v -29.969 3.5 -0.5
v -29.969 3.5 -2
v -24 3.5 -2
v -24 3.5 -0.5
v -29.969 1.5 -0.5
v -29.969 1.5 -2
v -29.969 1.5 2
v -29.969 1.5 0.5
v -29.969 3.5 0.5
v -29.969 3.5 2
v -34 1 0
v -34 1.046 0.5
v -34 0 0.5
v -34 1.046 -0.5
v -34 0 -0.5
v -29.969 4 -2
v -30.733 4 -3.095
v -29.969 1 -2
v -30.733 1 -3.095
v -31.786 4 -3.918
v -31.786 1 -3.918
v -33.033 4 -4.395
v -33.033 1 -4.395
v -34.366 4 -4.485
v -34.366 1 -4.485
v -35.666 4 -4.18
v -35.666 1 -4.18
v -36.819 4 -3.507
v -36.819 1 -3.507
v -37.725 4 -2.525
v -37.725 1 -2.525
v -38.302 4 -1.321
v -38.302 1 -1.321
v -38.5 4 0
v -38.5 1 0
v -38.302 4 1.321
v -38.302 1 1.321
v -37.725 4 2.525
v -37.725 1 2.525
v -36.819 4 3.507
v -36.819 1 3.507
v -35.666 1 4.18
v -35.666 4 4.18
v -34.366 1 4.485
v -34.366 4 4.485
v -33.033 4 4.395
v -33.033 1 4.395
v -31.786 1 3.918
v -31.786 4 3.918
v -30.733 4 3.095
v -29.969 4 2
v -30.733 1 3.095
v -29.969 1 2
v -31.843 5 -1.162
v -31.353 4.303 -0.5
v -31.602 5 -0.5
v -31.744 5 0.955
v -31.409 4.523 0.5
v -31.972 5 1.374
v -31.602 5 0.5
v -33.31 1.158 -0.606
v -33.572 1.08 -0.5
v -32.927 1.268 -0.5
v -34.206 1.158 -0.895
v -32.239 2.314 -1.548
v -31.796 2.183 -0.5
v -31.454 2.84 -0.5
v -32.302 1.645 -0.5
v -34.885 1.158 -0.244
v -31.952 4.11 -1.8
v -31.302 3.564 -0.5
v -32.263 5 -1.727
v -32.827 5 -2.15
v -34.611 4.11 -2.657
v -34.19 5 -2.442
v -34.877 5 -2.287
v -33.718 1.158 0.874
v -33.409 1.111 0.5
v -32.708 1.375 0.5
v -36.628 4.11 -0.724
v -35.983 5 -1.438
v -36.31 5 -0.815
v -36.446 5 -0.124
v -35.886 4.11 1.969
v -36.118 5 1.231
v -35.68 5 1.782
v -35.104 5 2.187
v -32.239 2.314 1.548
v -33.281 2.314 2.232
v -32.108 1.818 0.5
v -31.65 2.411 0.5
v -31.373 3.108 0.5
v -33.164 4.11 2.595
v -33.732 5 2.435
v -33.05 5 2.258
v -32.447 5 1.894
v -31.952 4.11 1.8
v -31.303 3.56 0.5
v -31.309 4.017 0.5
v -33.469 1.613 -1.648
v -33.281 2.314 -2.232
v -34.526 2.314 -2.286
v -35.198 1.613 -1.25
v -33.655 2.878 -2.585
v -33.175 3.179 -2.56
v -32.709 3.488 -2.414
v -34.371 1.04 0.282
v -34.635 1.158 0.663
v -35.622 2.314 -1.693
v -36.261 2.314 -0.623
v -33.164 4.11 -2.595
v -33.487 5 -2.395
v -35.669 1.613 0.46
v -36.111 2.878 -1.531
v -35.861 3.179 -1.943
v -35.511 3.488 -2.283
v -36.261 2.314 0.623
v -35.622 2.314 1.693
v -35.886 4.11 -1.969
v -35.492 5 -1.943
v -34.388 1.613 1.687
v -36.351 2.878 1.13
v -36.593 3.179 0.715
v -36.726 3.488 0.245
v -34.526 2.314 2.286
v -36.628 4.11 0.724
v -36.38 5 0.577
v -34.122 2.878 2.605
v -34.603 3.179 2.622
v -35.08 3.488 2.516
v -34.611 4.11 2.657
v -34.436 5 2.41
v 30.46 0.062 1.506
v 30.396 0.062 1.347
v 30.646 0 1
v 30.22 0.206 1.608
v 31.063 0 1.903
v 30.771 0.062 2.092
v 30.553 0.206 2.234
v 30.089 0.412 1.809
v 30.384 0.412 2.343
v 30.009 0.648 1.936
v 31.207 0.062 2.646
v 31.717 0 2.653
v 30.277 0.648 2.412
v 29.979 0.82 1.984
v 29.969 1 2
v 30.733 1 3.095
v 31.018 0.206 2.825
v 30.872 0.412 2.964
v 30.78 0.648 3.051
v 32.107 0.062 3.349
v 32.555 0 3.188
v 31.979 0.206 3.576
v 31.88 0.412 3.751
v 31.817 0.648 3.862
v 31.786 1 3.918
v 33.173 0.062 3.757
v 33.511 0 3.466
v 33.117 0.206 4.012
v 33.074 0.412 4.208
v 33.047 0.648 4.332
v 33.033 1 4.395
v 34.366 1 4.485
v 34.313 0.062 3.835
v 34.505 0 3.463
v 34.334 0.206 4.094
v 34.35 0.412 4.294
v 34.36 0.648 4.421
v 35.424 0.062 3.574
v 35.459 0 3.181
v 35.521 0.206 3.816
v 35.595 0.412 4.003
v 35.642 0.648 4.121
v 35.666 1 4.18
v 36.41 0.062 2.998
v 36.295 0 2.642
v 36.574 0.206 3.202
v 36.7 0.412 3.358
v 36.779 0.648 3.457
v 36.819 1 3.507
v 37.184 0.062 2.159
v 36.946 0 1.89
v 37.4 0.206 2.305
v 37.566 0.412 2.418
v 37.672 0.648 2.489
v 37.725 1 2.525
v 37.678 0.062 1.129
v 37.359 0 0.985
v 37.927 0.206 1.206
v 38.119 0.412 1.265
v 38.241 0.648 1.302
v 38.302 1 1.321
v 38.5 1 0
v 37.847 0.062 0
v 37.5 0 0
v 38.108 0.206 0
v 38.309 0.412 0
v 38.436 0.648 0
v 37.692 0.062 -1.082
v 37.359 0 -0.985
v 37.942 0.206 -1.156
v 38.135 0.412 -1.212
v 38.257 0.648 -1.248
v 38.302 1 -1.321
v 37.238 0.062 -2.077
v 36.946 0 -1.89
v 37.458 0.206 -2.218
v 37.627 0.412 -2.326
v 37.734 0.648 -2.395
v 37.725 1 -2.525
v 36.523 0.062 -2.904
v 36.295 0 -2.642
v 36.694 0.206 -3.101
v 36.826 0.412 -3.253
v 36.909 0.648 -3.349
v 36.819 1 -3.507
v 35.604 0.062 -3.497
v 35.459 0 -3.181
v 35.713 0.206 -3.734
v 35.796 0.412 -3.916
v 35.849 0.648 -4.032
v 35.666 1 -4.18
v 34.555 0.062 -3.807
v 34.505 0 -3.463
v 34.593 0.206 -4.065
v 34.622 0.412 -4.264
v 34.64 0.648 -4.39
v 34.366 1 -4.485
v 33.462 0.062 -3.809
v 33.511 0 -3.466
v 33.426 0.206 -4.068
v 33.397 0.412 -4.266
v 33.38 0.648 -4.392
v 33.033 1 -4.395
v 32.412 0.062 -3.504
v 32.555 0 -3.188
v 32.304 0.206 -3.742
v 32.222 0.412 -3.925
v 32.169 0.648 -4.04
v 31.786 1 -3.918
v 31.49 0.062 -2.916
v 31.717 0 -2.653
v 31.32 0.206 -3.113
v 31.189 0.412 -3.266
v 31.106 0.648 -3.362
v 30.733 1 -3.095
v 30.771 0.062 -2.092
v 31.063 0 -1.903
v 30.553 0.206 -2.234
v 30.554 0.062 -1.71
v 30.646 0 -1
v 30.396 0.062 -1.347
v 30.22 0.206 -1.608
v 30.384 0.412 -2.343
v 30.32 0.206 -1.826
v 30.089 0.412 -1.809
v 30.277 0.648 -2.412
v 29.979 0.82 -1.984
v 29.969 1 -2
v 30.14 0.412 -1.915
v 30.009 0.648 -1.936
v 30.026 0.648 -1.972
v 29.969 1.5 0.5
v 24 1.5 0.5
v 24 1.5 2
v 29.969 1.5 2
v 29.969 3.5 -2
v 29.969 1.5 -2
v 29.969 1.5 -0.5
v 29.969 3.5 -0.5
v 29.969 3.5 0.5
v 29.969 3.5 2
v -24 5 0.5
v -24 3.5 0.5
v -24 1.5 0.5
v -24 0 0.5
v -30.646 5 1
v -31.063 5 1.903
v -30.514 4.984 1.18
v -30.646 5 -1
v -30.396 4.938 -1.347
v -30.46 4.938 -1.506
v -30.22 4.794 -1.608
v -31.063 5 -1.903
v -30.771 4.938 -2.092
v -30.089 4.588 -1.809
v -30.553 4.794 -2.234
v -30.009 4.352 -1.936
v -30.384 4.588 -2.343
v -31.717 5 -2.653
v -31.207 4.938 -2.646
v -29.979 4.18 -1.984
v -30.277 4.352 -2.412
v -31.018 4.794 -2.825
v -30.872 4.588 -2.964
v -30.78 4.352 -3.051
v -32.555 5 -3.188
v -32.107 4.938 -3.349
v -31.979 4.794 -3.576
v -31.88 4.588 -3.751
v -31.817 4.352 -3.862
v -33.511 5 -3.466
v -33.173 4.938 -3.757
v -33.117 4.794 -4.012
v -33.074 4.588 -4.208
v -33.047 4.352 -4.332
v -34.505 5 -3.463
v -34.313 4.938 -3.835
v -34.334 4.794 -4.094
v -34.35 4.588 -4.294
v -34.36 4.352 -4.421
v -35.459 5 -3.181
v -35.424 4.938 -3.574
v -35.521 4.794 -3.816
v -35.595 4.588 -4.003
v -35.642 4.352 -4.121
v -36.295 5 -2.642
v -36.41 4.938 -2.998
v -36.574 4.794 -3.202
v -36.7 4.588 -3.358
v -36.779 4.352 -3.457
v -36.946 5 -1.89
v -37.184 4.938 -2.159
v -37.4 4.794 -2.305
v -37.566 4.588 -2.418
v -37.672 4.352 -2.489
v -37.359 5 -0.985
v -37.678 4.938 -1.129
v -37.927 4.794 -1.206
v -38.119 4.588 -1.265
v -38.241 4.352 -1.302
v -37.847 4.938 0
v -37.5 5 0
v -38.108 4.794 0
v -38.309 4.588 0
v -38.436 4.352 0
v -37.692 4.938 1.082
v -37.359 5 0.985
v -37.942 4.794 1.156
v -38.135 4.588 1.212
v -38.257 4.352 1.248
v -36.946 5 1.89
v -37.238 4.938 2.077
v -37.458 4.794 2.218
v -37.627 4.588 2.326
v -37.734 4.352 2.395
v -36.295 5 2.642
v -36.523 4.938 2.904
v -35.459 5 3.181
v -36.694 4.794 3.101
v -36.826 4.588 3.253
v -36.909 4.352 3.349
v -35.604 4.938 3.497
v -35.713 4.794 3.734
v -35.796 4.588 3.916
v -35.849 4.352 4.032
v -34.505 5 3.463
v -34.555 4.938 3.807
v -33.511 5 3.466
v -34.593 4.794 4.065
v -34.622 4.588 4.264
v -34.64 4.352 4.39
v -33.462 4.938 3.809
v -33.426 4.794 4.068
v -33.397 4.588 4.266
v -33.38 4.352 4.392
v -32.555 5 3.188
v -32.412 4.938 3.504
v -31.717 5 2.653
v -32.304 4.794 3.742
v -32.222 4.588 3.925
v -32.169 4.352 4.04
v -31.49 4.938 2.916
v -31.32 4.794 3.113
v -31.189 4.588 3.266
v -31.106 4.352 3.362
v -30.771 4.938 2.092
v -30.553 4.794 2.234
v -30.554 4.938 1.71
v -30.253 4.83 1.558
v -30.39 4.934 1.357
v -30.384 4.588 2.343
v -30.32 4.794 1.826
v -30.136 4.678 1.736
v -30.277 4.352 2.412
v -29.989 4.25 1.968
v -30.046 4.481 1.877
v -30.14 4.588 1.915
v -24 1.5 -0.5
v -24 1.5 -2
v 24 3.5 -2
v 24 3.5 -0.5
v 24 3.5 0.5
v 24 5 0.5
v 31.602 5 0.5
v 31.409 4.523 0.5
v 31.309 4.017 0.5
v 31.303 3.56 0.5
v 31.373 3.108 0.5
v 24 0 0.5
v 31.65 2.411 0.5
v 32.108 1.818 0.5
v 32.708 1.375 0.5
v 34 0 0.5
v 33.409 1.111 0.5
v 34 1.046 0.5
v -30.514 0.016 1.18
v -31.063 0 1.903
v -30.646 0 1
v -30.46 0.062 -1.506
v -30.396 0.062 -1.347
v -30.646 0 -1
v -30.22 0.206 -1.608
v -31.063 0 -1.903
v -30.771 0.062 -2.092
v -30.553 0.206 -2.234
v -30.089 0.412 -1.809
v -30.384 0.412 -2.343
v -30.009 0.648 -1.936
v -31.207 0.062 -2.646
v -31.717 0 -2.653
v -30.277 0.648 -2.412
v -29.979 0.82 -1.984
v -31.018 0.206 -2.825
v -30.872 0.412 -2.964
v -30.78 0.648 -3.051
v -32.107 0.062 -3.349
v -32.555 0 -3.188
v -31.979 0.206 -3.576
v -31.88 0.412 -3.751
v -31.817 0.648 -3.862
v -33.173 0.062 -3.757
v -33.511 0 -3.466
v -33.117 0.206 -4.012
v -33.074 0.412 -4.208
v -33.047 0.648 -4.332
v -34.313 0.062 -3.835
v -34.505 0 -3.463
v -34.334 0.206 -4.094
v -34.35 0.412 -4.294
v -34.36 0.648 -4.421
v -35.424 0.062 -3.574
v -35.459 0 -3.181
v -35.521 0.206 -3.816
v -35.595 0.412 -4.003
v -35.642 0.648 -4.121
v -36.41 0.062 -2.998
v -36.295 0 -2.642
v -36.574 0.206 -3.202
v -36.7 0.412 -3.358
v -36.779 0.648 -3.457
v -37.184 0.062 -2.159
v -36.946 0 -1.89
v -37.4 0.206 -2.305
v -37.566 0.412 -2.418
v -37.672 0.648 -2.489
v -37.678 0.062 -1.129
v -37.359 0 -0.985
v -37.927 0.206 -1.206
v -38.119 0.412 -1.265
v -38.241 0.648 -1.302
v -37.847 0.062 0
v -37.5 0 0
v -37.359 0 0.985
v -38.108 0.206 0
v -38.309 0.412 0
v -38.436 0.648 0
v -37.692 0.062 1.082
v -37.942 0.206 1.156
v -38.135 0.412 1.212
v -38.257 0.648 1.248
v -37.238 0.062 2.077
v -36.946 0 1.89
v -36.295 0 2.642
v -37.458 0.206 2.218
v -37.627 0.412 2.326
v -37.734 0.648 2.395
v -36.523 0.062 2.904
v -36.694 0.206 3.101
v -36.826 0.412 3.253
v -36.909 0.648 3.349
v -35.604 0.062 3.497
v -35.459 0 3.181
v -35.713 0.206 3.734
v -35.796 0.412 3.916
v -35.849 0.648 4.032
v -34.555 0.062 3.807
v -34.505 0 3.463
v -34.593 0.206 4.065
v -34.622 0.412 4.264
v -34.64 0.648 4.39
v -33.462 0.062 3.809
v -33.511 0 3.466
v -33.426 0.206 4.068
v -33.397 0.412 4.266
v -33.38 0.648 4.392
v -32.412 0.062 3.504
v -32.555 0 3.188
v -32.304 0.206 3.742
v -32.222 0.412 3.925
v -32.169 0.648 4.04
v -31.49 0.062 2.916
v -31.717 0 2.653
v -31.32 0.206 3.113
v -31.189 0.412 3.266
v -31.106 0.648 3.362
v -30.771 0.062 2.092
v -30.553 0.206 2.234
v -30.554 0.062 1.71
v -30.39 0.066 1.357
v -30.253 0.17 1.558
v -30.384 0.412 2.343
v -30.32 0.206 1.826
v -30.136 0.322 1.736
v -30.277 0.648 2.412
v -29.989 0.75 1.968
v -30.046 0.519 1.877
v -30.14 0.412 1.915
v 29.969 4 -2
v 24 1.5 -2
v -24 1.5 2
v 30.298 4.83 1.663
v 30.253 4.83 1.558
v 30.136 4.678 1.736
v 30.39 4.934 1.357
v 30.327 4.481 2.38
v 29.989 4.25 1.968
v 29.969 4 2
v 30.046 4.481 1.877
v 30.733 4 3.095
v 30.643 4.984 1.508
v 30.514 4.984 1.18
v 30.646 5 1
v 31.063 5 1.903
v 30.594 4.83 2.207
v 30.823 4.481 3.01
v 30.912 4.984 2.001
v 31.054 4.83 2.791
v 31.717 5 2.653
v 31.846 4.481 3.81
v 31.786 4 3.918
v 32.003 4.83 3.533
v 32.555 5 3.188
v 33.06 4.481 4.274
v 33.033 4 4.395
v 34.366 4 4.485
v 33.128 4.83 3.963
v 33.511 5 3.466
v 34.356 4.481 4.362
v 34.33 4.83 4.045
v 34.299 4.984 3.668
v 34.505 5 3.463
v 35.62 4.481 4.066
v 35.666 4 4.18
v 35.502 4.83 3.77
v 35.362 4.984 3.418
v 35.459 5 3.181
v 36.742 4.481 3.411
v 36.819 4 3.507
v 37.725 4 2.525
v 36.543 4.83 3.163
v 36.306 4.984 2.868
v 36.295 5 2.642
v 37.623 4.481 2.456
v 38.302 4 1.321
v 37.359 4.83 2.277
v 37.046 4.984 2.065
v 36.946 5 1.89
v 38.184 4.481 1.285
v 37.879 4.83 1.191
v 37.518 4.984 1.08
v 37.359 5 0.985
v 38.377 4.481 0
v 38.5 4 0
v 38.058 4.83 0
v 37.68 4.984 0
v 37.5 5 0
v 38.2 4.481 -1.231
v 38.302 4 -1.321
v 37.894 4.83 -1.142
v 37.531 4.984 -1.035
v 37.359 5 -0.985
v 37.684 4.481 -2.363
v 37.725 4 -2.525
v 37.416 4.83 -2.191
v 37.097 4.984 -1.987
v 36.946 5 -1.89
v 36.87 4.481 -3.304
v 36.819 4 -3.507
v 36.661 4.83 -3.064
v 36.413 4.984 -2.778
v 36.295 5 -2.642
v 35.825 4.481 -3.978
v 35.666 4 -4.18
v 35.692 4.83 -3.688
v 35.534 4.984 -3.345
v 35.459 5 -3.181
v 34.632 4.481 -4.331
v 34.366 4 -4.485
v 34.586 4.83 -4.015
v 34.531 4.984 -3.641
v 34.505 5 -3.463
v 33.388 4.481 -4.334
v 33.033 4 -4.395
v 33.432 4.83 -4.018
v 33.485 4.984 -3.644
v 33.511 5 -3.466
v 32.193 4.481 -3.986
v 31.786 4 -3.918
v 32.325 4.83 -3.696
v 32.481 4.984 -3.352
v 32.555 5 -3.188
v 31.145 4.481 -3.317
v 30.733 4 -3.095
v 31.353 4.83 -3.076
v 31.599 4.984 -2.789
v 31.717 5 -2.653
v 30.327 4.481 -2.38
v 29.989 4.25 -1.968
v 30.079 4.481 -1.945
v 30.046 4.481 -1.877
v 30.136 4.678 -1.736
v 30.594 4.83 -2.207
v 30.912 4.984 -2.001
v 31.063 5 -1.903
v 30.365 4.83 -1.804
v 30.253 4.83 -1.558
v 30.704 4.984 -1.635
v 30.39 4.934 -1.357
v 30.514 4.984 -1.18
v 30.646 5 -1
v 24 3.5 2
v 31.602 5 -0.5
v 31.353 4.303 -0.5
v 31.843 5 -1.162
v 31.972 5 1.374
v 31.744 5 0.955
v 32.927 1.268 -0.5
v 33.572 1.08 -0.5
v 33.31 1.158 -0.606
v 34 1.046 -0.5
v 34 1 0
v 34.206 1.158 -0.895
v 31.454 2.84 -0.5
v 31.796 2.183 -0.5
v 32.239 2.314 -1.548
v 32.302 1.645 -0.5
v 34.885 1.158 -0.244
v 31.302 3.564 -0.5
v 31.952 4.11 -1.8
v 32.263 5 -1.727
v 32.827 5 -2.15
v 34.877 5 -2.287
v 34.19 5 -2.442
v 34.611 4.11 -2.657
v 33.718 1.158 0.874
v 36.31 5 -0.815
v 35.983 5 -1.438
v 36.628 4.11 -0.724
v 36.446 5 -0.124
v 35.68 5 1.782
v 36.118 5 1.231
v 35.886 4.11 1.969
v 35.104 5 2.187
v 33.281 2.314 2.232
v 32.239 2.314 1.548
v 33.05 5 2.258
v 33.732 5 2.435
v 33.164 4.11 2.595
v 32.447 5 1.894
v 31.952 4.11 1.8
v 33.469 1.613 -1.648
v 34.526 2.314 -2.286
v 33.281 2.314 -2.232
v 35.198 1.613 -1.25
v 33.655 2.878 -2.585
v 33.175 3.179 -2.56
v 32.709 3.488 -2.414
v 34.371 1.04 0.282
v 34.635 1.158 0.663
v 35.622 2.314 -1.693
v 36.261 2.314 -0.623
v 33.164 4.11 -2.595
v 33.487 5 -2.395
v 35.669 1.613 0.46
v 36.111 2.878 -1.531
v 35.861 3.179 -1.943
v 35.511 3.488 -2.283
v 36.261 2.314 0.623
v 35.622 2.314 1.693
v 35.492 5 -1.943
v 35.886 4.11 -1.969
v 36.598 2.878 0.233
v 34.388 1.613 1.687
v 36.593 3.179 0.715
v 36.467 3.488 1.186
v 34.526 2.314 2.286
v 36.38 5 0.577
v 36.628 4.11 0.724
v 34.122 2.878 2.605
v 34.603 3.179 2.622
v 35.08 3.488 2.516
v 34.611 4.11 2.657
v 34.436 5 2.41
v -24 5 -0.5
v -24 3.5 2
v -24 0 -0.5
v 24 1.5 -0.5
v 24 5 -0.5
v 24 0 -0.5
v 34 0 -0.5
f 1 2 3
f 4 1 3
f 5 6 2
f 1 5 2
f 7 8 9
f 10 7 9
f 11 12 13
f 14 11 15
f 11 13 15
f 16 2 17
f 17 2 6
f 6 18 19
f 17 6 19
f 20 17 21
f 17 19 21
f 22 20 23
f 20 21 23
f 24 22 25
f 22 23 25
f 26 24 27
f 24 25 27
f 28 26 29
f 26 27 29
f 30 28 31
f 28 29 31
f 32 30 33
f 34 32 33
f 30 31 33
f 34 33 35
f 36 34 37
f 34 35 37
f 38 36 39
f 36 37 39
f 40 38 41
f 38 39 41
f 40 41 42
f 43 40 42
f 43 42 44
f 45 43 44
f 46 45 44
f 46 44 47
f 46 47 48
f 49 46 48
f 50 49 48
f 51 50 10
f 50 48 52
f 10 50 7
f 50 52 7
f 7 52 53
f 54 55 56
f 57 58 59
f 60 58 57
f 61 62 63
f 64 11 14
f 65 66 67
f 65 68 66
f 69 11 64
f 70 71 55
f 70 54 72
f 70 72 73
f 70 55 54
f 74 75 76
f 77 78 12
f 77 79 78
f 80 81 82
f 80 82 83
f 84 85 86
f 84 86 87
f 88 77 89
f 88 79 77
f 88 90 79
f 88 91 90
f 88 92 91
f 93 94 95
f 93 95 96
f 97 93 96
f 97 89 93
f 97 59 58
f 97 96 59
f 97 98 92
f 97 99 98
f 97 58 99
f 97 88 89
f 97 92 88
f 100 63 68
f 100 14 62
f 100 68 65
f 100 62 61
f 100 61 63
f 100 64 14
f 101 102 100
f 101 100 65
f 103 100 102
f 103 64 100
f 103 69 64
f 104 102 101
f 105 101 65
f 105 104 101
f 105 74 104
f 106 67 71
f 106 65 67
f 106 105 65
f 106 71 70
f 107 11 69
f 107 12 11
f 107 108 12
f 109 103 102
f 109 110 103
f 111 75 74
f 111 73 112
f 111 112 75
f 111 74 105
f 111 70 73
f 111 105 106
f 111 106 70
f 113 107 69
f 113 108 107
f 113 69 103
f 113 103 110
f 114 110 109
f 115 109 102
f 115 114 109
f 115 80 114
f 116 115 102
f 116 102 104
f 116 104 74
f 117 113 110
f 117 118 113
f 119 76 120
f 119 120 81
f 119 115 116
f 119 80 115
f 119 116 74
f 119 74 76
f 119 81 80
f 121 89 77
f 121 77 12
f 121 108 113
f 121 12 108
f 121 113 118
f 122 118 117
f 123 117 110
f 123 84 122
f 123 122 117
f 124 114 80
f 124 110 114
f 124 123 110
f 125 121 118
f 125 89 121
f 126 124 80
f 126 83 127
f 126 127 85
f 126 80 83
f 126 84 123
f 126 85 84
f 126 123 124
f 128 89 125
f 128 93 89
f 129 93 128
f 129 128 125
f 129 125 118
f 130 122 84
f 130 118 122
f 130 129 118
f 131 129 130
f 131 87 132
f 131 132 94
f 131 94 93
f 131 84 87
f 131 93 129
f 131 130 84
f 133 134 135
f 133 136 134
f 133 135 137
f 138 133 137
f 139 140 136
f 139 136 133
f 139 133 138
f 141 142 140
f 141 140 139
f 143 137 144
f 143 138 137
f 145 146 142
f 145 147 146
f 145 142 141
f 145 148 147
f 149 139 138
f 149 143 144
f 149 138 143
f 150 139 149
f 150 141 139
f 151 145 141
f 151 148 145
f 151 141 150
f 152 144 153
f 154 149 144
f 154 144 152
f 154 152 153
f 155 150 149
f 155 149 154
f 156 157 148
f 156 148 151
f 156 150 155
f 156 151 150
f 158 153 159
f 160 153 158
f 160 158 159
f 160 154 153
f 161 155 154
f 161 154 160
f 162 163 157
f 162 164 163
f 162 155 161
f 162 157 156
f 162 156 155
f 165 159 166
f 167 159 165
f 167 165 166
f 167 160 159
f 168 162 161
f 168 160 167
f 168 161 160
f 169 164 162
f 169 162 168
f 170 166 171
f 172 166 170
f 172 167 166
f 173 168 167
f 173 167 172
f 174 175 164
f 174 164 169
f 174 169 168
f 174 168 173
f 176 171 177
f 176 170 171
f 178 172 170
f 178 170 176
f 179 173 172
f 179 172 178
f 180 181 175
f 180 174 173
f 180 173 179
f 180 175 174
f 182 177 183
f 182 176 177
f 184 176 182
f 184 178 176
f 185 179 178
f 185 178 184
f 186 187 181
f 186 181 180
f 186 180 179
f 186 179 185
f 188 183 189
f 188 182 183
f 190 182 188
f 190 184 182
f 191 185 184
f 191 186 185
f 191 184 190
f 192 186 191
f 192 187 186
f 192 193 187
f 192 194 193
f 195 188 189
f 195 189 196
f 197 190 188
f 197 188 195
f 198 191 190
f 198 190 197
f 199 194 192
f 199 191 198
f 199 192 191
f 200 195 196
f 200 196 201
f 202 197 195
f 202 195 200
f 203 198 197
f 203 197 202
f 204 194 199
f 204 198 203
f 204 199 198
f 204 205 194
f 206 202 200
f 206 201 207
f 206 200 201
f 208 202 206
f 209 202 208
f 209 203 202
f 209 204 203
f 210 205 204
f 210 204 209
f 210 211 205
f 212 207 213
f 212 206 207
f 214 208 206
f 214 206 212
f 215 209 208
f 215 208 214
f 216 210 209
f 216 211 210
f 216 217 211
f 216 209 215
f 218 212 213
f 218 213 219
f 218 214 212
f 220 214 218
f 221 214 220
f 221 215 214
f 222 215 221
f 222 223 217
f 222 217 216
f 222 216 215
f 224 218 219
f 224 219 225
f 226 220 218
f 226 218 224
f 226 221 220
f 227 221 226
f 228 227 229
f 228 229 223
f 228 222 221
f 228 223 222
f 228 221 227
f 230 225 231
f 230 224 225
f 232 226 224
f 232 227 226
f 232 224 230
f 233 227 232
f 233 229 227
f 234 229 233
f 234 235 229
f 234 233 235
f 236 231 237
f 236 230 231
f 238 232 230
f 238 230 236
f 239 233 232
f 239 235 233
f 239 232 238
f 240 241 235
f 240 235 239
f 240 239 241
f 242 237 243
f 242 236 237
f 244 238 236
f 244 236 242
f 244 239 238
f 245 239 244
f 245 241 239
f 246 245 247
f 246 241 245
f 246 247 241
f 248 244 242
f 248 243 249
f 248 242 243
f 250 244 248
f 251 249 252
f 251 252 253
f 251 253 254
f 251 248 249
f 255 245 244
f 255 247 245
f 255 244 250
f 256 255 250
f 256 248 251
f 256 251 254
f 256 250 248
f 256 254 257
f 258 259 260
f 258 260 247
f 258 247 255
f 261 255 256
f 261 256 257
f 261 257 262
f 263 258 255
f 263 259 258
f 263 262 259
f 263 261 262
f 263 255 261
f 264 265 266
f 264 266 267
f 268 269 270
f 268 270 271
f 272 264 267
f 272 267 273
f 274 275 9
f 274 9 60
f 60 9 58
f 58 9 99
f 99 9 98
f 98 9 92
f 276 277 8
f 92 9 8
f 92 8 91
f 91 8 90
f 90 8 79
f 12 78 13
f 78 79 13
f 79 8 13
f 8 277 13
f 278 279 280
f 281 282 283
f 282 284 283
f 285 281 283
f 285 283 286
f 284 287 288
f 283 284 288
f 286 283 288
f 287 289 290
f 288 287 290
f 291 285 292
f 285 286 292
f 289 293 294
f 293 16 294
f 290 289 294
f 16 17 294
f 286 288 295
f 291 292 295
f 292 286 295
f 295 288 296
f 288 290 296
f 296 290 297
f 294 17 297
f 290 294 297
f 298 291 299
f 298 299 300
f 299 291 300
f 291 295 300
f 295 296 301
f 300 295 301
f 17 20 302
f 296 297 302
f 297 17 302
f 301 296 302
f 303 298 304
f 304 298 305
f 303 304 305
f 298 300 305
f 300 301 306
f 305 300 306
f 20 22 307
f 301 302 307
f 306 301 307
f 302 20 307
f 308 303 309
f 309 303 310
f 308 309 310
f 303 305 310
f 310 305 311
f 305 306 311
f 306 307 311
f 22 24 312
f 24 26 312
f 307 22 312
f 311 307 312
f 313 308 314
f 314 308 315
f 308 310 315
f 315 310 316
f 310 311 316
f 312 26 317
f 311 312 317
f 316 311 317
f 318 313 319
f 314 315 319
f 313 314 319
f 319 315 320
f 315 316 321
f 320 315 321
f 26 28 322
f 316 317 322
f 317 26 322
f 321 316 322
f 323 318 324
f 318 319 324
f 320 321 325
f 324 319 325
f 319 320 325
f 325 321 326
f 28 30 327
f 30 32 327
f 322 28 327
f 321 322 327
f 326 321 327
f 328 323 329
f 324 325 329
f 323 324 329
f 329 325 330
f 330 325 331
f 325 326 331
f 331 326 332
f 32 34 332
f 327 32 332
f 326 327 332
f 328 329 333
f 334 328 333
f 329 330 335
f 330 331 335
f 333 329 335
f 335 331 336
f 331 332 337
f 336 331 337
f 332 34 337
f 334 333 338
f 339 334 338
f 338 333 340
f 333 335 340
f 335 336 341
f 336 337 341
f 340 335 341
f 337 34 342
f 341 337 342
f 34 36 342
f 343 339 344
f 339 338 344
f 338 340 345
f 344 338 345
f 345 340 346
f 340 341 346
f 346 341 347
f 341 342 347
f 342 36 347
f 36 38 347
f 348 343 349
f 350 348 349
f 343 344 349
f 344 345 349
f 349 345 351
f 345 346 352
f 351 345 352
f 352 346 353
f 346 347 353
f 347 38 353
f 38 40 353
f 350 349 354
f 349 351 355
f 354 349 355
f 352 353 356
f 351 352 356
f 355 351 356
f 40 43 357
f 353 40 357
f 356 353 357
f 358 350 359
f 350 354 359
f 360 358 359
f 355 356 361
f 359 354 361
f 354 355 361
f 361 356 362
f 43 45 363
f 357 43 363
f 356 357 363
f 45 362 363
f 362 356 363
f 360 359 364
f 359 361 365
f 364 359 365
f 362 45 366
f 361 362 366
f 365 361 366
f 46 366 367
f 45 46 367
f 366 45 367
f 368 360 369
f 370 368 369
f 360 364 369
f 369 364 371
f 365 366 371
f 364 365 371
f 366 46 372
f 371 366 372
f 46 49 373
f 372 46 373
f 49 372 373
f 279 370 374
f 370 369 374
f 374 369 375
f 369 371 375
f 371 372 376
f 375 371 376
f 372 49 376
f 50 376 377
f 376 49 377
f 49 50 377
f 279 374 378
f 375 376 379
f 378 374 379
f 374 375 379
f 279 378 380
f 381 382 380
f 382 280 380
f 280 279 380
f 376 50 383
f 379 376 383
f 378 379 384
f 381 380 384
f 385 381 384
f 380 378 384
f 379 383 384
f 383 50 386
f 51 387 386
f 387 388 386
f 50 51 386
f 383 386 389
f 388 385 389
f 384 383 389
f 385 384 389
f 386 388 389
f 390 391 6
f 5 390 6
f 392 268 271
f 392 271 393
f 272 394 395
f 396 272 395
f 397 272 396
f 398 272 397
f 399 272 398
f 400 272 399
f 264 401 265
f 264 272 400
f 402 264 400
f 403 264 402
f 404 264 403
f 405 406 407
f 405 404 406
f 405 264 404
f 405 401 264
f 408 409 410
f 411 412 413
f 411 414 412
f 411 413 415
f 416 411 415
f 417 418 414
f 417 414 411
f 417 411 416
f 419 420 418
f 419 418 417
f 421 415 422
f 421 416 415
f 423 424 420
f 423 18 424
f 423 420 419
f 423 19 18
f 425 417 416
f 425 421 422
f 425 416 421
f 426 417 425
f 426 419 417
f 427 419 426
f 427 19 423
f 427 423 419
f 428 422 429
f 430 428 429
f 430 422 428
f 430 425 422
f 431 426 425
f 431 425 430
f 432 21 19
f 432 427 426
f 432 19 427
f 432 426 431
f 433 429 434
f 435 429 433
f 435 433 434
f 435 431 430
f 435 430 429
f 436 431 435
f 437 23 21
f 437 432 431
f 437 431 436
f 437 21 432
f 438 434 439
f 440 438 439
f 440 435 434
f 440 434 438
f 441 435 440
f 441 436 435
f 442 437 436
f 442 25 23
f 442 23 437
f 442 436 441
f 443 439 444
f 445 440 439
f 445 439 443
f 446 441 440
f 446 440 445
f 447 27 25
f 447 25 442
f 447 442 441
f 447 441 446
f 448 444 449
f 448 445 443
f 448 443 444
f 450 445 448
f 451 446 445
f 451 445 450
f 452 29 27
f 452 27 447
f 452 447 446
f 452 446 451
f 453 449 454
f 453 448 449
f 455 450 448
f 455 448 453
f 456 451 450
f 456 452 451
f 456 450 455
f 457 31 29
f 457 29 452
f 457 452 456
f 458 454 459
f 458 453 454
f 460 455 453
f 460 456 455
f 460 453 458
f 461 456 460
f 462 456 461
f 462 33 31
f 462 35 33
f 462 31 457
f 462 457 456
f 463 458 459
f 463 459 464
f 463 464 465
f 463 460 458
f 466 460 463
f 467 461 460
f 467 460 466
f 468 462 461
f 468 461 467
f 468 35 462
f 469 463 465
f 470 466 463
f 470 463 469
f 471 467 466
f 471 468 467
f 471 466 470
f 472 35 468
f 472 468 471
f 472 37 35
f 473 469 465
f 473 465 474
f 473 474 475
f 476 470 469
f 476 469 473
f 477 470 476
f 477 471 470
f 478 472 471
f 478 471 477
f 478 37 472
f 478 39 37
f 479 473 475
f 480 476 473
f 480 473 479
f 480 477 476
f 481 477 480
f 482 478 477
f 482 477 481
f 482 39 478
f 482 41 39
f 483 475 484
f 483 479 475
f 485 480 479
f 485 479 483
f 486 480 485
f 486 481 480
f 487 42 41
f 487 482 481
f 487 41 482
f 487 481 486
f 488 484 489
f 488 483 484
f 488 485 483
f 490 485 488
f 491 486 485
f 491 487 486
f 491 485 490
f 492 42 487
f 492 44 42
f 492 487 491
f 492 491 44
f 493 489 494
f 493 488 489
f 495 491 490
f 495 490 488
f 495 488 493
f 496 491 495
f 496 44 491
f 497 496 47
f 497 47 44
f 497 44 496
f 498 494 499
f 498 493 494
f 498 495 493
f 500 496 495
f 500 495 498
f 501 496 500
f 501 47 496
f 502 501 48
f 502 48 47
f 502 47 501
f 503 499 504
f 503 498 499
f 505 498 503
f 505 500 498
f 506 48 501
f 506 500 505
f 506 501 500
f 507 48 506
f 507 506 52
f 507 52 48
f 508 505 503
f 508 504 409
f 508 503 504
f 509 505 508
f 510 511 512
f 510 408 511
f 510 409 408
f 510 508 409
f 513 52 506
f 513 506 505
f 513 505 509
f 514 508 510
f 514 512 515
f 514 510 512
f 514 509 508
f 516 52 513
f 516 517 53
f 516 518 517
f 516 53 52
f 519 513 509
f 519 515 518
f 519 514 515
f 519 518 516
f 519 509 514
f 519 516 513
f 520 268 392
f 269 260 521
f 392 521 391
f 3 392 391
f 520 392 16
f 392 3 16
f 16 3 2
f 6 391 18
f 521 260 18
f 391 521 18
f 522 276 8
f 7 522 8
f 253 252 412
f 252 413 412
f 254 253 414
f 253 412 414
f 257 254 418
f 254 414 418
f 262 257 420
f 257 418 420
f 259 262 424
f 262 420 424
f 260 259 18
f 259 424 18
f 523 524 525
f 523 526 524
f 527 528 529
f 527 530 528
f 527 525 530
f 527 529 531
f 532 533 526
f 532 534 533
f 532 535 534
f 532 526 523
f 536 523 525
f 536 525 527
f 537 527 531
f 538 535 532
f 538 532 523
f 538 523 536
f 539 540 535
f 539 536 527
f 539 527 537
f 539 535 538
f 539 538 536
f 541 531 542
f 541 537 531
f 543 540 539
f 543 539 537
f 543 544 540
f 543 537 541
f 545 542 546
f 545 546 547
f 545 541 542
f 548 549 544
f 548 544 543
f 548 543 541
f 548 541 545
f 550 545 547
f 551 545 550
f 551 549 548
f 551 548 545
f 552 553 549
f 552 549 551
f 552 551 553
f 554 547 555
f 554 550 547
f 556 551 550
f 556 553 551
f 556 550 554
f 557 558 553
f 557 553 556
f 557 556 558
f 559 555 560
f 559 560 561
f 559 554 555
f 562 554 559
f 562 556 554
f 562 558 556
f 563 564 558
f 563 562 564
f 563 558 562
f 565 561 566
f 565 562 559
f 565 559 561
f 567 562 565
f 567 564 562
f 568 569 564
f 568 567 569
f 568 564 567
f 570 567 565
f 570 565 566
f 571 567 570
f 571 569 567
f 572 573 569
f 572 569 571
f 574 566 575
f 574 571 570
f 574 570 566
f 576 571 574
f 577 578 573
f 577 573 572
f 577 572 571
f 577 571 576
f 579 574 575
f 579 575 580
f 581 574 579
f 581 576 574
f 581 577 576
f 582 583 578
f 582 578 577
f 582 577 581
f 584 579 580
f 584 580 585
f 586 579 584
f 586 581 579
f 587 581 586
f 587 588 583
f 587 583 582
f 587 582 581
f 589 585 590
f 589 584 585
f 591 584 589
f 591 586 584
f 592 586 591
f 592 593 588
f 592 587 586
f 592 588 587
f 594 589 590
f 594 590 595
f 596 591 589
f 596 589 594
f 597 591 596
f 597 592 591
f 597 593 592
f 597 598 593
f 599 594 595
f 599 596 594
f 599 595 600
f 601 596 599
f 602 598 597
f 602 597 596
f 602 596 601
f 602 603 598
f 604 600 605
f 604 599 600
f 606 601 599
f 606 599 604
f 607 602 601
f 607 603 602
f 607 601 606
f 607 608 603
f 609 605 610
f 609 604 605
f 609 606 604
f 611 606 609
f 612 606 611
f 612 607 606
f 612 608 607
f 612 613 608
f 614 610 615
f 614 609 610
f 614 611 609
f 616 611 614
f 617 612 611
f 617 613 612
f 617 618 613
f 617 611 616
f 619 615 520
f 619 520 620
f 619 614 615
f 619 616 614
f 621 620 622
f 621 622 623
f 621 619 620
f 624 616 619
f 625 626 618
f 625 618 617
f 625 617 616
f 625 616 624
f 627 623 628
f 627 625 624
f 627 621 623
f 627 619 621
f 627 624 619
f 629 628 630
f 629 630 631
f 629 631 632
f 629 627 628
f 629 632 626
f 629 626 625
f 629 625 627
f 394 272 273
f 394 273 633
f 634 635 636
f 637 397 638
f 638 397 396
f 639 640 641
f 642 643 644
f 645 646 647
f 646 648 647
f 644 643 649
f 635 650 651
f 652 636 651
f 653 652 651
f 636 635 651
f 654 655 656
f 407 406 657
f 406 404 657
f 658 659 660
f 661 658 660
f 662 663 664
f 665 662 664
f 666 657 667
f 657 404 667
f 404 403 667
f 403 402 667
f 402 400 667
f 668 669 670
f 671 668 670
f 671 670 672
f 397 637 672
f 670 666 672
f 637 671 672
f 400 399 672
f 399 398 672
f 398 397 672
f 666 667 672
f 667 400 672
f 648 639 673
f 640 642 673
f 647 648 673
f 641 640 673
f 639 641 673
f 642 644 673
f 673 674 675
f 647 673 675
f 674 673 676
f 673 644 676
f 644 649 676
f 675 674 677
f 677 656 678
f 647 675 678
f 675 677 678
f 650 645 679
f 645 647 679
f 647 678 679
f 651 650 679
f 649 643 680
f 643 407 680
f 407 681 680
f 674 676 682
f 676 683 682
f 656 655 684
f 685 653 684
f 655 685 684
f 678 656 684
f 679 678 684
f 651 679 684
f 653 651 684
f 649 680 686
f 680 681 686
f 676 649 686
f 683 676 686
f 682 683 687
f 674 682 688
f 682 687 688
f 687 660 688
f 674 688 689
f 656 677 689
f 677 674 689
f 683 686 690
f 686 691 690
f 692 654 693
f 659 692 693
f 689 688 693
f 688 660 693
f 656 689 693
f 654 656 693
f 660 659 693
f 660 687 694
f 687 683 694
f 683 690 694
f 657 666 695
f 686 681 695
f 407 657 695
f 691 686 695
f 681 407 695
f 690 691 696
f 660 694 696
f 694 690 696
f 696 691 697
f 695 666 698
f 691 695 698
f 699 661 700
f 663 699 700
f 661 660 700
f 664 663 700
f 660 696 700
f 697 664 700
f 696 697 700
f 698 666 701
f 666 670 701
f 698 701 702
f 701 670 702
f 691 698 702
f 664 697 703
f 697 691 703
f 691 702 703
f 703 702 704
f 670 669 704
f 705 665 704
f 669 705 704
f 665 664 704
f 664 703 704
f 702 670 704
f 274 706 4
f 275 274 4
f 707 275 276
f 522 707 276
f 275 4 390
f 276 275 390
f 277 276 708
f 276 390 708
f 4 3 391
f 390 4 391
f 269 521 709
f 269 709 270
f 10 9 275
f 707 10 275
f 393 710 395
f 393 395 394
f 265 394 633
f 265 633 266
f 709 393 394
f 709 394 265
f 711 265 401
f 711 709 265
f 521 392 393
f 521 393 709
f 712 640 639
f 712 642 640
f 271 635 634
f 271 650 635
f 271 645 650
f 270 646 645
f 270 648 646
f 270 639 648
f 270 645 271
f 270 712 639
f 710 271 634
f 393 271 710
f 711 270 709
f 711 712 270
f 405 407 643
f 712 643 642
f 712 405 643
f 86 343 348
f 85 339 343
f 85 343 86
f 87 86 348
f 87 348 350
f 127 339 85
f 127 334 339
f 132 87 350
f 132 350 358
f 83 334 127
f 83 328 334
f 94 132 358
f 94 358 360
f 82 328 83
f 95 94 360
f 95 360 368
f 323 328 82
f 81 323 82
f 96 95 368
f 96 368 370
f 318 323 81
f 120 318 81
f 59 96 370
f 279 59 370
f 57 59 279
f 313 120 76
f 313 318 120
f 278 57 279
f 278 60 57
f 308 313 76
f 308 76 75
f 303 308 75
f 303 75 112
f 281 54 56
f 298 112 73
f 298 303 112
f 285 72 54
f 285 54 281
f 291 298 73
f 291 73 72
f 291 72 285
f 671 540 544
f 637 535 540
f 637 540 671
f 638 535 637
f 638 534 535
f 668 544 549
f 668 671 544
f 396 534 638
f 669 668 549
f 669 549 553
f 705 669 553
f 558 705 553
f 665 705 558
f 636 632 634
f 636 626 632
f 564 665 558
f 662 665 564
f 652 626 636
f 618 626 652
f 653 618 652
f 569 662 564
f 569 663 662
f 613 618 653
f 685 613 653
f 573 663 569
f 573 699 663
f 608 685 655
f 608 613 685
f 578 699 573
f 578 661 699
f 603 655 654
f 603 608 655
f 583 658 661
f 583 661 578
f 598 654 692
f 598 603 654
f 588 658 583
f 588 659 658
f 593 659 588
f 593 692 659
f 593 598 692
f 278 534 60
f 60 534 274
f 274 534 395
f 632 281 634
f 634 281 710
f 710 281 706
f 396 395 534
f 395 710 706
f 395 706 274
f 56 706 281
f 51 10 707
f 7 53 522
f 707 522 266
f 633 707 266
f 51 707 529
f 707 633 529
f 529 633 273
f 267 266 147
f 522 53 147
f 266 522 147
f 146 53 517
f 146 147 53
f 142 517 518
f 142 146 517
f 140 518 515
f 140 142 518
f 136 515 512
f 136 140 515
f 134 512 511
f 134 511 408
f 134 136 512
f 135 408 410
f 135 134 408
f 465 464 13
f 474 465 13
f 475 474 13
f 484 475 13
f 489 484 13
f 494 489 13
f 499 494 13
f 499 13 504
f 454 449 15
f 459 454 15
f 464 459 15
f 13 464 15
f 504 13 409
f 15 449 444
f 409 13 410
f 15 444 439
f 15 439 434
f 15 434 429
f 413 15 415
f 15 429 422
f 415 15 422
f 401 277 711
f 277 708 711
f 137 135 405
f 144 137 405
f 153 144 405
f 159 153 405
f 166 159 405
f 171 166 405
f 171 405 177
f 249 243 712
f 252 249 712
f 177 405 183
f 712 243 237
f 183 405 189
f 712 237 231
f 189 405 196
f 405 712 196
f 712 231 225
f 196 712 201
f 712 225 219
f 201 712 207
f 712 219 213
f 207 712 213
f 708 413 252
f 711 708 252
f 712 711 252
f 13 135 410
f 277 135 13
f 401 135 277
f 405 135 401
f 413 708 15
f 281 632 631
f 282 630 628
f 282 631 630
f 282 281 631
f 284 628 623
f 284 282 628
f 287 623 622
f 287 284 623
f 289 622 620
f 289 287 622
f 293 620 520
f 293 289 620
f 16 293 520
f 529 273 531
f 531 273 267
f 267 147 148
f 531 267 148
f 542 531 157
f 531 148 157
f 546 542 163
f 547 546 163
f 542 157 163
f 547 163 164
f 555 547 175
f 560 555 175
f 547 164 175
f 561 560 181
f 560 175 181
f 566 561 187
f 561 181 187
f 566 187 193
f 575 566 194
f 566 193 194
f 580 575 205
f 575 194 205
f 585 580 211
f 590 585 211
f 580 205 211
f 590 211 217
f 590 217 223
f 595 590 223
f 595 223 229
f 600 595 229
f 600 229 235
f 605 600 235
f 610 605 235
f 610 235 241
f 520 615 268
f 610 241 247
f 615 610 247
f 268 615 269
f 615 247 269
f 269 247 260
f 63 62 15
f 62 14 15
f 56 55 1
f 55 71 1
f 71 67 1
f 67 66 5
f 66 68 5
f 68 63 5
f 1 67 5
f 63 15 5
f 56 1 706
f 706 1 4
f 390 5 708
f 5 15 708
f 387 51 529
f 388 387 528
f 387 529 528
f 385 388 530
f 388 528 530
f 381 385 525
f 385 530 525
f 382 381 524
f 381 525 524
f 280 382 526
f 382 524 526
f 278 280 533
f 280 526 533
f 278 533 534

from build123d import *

# Parameters (mm, degrees)
BOSS_EXTRUDE1_DEPTH = 5
CUT_EXTRUDE1_REACH  = 41.083
CUT_EXTRUDE2_REACH  = 41.364
FILLET1_R           = 1


with BuildPart() as part:
    # Sketch1 → Boss-Extrude1 (new body)
    with BuildSketch(Plane(origin=(0, 0, 0), x_dir=(1, 0, 0), z_dir=(0, 1, 0))):
        with BuildLine():
            Line((-33.99999999999999, 2), (-33.99999999999999, -2))
            Line((-33.99999999999999, -2), (-29.968871125850622, -2))
            ThreePointArc((-29.968871125850665, -1.9999999999998734), (-29.618785560277153, -1.0271124734730797), (-29.5, -1.1e-15))
            ThreePointArc((-29.5, 0), (-29.618785560277153, 1.0271124734730805), (-29.968871125850665, 1.9999999999998725))
            Line((-29.968871125850622, 2), (-33.99999999999999, 2))
        make_face()
        with BuildLine():
            Line((-29.968871125850622, -2), (-33.99999999999999, -2))
            Line((-33.99999999999999, -2), (-33.99999999999999, 2))
            Line((-33.99999999999999, 2), (-29.968871125850622, 2))
            ThreePointArc((-29.968871125850665, 1.9999999999998725), (-38.499999999999986, 5.5e-16), (-29.968871125850665, -1.9999999999998734))
        make_face()
        with BuildLine():
            ThreePointArc((-29.5, -1.1e-15), (-29.618785560277153, -1.0271124734730797), (-29.968871125850665, -1.9999999999998734))
            Line((-29.968871125850622, -2), (29.96887112585072, -2))
            ThreePointArc((29.96887112585073, -1.9999999999999722), (29.500000000000014, 5.5e-16), (29.96887112585073, 1.9999999999999731))
            Line((29.96887112585072, 2), (-29.968871125850622, 2))
            ThreePointArc((-29.968871125850665, 1.9999999999998725), (-29.618785560277153, 1.0271124734730805), (-29.5, 0))
        make_face()
        with BuildLine():
            ThreePointArc((29.96887112585073, 1.9999999999999731), (29.500000000000014, 5.5e-16), (29.96887112585073, -1.9999999999999722))
            Line((29.96887112585072, -2), (34.00000000000001, -2))
            Line((34.00000000000001, -2), (34.00000000000001, 2))
            Line((34.00000000000001, 2), (29.96887112585072, 2))
        make_face()
        with BuildLine():
            Line((34.00000000000001, -2), (29.96887112585072, -2))
            ThreePointArc((29.96887112585073, -1.9999999999999722), (35.02711247347314, -4.38121443972283), (38.5, -1.1e-15))
            ThreePointArc((38.5, 0), (35.02711247347314, 4.381214439722829), (29.96887112585073, 1.9999999999999731))
            Line((29.96887112585072, 2), (34.00000000000001, 2))
            Line((34.00000000000001, 2), (34.00000000000001, -2))
        make_face()
    extrude(amount=BOSS_EXTRUDE1_DEPTH)

    # Cut-Sweep1: sweep along a path in Sketch2
    with BuildLine(Plane(origin=(0, 5, 0), x_dir=(1, 0, 0), z_dir=(0, 1, 0))) as cut_sweep1_path:
        CenterArc((-33.99999999999999, 0), 4.499999999999991, 0, 360)
    # 3DSketch1 → Cut-Sweep1 (sweep, cut)
    with BuildSketch(Plane(origin=(-33.99999999999999, 5, 0), x_dir=(0, -1, 0), z_dir=(-1, 0, 0))):
        with BuildLine():
            Line((0, 0), (-1.5000000000000004, 0))
            ThreePointArc((-1.5000000000000004, 0), (1.25, 2.75), (4, 0))
            Line((4, 0), (0, 0))
        make_face()
    cut_sweep1 = sweep(path=cut_sweep1_path.line, mode=Mode.SUBTRACT)

    # Mirror1: Cut-Sweep1 across plane
    add(cut_sweep1.mirror(Plane(origin=(0, 0, 0), x_dir=(0, 0, 1), z_dir=(1, 0, 0))), mode=Mode.SUBTRACT)

    # Cut-Extrude1: up to this face of the body (flat: up to its plane)
    cut_extrude1_end = Plane(part.part.faces().sort_by_distance((0, 5, -2.639e-06))[0])
    # Sketch3 → Cut-Extrude1 (cut, up to the picked face)
    with BuildSketch(Plane.XZ, mode=Mode.PRIVATE) as cut_extrude1_sk1:
        with BuildLine():
            ThreePointArc((-29.52786404500042, 0.49999999999997785), (-29.506971411314076, 0.2503879015666308), (-29.5, 0))
            Line((-29.5, 0), (-23.999999999999993, 0))
            Line((-23.999999999999993, 0), (-23.999999999999993, 0.5))
            Line((-23.999999999999993, 0.5), (-29.527864045000417, 0.5))
        make_face()
    cut_extrude1_tool1 = split(extrude(cut_extrude1_sk1.sketch, amount=-CUT_EXTRUDE1_REACH, mode=Mode.PRIVATE), bisect_by=cut_extrude1_end, keep=Keep.BOTH, mode=Mode.PRIVATE)
    # Sketch3 → Cut-Extrude1 (cut, up to the picked face)
    with BuildSketch(Plane.XZ, mode=Mode.PRIVATE) as cut_extrude1_sk2:
        with BuildLine():
            Line((-23.999999999999993, 0), (-29.5, 0))
            ThreePointArc((-29.5, -1.1e-15), (-29.506971411314076, -0.25038790156662954), (-29.52786404500042, -0.49999999999997824))
            Line((-29.527864045000417, -0.5), (-23.999999999999993, -0.5))
            Line((-23.999999999999993, -0.5), (-23.999999999999993, 0))
        make_face()
    cut_extrude1_tool2 = split(extrude(cut_extrude1_sk2.sketch, amount=-CUT_EXTRUDE1_REACH, mode=Mode.PRIVATE), bisect_by=cut_extrude1_end, keep=Keep.BOTH, mode=Mode.PRIVATE)
    # Sketch3 → Cut-Extrude1 (cut, up to the picked face)
    with BuildSketch(Plane.XZ, mode=Mode.PRIVATE) as cut_extrude1_sk3:
        with BuildLine():
            Line((-33.99999999999999, 0.5), (-33.99999999999999, 0))
            Line((-33.99999999999999, 0), (-29.5, 0))
            ThreePointArc((-29.5, 0), (-29.506971411314076, 0.2503879015666308), (-29.52786404500042, 0.49999999999997785))
            Line((-29.527864045000417, 0.5), (-33.99999999999999, 0.5))
        make_face()
    cut_extrude1_tool3 = split(extrude(cut_extrude1_sk3.sketch, amount=-CUT_EXTRUDE1_REACH, mode=Mode.PRIVATE), bisect_by=cut_extrude1_end, keep=Keep.BOTH, mode=Mode.PRIVATE)
    # Sketch3 → Cut-Extrude1 (cut, up to the picked face)
    with BuildSketch(Plane.XZ, mode=Mode.PRIVATE) as cut_extrude1_sk4:
        with BuildLine():
            Line((-29.5, 0), (-33.99999999999999, 0))
            Line((-33.99999999999999, 0), (-33.99999999999999, -0.5))
            Line((-33.99999999999999, -0.5), (-29.527864045000417, -0.5))
            ThreePointArc((-29.52786404500042, -0.49999999999997824), (-29.506971411314076, -0.25038790156662954), (-29.5, -1.1e-15))
        make_face()
    cut_extrude1_tool4 = split(extrude(cut_extrude1_sk4.sketch, amount=-CUT_EXTRUDE1_REACH, mode=Mode.PRIVATE), bisect_by=cut_extrude1_end, keep=Keep.BOTH, mode=Mode.PRIVATE)
    cut_extrude1_1 = cut_extrude1_tool1.solids().sort_by(Axis((-26.754644, 0, 0.250211), (0, 1, 0)))[0]
    add(cut_extrude1_1, mode=Mode.SUBTRACT)
    cut_extrude1_2 = cut_extrude1_tool2.solids().sort_by(Axis((-26.754644, 0, -0.250211), (0, 1, 0)))[0]
    add(cut_extrude1_2, mode=Mode.SUBTRACT)
    cut_extrude1_3 = cut_extrude1_tool3.solids().sort_by(Axis((-31.754631, 0, 0.249742), (0, 1, 0)))[0]
    add(cut_extrude1_3, mode=Mode.SUBTRACT)
    cut_extrude1_4 = cut_extrude1_tool4.solids().sort_by(Axis((-31.754631, 0, -0.249742), (0, 1, 0)))[0]
    add(cut_extrude1_4, mode=Mode.SUBTRACT)
    cut_extrude1 = cut_extrude1_1 + cut_extrude1_2 + cut_extrude1_3 + cut_extrude1_4  # Cut-Extrude1 as one shape, for the pattern or mirror that repeats it

    # Mirror2: Cut-Extrude1 across plane
    add(cut_extrude1.mirror(Plane(origin=(0, 0, 0), x_dir=(0, 0, 1), z_dir=(1, 0, 0))), mode=Mode.SUBTRACT)

    # Cut-Extrude2: up to this face of the body (flat: up to its plane)
    cut_extrude2_end = Plane(part.part.faces().sort_by_distance((0, 2.5, 2))[0])
    # Sketch4 → Cut-Extrude2 (cut, up to the picked face)
    with BuildSketch(Plane(origin=(0, 0, -2), x_dir=(-1, 0, 0), z_dir=(0, 0, -1)), mode=Mode.PRIVATE) as cut_extrude2_sk1:
        Polygon((23.99999999999999, 1.5000000000000009), (28.178209788095508, 1.5000000000000009), (25.790661337755214, 3.5000000000000004), (23.99999999999999, 3.500000000000001), align=None)
    cut_extrude2_tool1 = split(extrude(cut_extrude2_sk1.sketch, amount=-CUT_EXTRUDE2_REACH, mode=Mode.PRIVATE), bisect_by=cut_extrude2_end, keep=Keep.BOTH, mode=Mode.PRIVATE)
    # Sketch4 → Cut-Extrude2 (cut, up to the picked face)
    with BuildSketch(Plane(origin=(0, 0, -2), x_dir=(-1, 0, 0), z_dir=(0, 0, -1)), mode=Mode.PRIVATE) as cut_extrude2_sk2:
        Polygon((25.790661337755214, 3.5000000000000004), (28.178209788095508, 1.5000000000000007), (29.96887112585073, 1.5000000000000009), (29.96887112585073, 3.500000000000001), align=None)
    cut_extrude2_tool2 = split(extrude(cut_extrude2_sk2.sketch, amount=-CUT_EXTRUDE2_REACH, mode=Mode.PRIVATE), bisect_by=cut_extrude2_end, keep=Keep.BOTH, mode=Mode.PRIVATE)
    cut_extrude2_1 = cut_extrude2_tool1.solids().sort_by(Axis((-25.571803, 2.366667, -2), (0, 0, 1)))[0]
    add(cut_extrude2_1, mode=Mode.SUBTRACT)
    cut_extrude2_2 = cut_extrude2_tool2.solids().sort_by(Axis((-28.397068, 2.633333, -2), (0, 0, 1)))[0]
    add(cut_extrude2_2, mode=Mode.SUBTRACT)
    cut_extrude2 = cut_extrude2_1 + cut_extrude2_2  # Cut-Extrude2 as one shape, for the pattern or mirror that repeats it

    # Mirror3: Cut-Extrude2 across plane
    add(cut_extrude2.mirror(Plane(origin=(0, 0, 0), x_dir=(0, 0, 1), z_dir=(1, 0, 0))), mode=Mode.SUBTRACT)

    # Fillet1
    fillet1_edges = [part.edges().sort_by_distance(p)[0] for p in [
        (3.908e-14, 5, 1.9999999999999665),
        (38.5, 5, 4.44e-15),
        (3.553e-14, 5, -1.999999999999966),
        (-38.50000000000023, 5, 5.89e-14),
        (3.553e-14, 0, -1.999999999999966),
        (38.5, 0, -2e-15),
        (3.908e-14, 0, 1.9999999999999665),
        (-38.50000000000024, 0, -6.573e-14),
    ]]
    fillet(fillet1_edges, radius=FILLET1_R)


solid = part.part
